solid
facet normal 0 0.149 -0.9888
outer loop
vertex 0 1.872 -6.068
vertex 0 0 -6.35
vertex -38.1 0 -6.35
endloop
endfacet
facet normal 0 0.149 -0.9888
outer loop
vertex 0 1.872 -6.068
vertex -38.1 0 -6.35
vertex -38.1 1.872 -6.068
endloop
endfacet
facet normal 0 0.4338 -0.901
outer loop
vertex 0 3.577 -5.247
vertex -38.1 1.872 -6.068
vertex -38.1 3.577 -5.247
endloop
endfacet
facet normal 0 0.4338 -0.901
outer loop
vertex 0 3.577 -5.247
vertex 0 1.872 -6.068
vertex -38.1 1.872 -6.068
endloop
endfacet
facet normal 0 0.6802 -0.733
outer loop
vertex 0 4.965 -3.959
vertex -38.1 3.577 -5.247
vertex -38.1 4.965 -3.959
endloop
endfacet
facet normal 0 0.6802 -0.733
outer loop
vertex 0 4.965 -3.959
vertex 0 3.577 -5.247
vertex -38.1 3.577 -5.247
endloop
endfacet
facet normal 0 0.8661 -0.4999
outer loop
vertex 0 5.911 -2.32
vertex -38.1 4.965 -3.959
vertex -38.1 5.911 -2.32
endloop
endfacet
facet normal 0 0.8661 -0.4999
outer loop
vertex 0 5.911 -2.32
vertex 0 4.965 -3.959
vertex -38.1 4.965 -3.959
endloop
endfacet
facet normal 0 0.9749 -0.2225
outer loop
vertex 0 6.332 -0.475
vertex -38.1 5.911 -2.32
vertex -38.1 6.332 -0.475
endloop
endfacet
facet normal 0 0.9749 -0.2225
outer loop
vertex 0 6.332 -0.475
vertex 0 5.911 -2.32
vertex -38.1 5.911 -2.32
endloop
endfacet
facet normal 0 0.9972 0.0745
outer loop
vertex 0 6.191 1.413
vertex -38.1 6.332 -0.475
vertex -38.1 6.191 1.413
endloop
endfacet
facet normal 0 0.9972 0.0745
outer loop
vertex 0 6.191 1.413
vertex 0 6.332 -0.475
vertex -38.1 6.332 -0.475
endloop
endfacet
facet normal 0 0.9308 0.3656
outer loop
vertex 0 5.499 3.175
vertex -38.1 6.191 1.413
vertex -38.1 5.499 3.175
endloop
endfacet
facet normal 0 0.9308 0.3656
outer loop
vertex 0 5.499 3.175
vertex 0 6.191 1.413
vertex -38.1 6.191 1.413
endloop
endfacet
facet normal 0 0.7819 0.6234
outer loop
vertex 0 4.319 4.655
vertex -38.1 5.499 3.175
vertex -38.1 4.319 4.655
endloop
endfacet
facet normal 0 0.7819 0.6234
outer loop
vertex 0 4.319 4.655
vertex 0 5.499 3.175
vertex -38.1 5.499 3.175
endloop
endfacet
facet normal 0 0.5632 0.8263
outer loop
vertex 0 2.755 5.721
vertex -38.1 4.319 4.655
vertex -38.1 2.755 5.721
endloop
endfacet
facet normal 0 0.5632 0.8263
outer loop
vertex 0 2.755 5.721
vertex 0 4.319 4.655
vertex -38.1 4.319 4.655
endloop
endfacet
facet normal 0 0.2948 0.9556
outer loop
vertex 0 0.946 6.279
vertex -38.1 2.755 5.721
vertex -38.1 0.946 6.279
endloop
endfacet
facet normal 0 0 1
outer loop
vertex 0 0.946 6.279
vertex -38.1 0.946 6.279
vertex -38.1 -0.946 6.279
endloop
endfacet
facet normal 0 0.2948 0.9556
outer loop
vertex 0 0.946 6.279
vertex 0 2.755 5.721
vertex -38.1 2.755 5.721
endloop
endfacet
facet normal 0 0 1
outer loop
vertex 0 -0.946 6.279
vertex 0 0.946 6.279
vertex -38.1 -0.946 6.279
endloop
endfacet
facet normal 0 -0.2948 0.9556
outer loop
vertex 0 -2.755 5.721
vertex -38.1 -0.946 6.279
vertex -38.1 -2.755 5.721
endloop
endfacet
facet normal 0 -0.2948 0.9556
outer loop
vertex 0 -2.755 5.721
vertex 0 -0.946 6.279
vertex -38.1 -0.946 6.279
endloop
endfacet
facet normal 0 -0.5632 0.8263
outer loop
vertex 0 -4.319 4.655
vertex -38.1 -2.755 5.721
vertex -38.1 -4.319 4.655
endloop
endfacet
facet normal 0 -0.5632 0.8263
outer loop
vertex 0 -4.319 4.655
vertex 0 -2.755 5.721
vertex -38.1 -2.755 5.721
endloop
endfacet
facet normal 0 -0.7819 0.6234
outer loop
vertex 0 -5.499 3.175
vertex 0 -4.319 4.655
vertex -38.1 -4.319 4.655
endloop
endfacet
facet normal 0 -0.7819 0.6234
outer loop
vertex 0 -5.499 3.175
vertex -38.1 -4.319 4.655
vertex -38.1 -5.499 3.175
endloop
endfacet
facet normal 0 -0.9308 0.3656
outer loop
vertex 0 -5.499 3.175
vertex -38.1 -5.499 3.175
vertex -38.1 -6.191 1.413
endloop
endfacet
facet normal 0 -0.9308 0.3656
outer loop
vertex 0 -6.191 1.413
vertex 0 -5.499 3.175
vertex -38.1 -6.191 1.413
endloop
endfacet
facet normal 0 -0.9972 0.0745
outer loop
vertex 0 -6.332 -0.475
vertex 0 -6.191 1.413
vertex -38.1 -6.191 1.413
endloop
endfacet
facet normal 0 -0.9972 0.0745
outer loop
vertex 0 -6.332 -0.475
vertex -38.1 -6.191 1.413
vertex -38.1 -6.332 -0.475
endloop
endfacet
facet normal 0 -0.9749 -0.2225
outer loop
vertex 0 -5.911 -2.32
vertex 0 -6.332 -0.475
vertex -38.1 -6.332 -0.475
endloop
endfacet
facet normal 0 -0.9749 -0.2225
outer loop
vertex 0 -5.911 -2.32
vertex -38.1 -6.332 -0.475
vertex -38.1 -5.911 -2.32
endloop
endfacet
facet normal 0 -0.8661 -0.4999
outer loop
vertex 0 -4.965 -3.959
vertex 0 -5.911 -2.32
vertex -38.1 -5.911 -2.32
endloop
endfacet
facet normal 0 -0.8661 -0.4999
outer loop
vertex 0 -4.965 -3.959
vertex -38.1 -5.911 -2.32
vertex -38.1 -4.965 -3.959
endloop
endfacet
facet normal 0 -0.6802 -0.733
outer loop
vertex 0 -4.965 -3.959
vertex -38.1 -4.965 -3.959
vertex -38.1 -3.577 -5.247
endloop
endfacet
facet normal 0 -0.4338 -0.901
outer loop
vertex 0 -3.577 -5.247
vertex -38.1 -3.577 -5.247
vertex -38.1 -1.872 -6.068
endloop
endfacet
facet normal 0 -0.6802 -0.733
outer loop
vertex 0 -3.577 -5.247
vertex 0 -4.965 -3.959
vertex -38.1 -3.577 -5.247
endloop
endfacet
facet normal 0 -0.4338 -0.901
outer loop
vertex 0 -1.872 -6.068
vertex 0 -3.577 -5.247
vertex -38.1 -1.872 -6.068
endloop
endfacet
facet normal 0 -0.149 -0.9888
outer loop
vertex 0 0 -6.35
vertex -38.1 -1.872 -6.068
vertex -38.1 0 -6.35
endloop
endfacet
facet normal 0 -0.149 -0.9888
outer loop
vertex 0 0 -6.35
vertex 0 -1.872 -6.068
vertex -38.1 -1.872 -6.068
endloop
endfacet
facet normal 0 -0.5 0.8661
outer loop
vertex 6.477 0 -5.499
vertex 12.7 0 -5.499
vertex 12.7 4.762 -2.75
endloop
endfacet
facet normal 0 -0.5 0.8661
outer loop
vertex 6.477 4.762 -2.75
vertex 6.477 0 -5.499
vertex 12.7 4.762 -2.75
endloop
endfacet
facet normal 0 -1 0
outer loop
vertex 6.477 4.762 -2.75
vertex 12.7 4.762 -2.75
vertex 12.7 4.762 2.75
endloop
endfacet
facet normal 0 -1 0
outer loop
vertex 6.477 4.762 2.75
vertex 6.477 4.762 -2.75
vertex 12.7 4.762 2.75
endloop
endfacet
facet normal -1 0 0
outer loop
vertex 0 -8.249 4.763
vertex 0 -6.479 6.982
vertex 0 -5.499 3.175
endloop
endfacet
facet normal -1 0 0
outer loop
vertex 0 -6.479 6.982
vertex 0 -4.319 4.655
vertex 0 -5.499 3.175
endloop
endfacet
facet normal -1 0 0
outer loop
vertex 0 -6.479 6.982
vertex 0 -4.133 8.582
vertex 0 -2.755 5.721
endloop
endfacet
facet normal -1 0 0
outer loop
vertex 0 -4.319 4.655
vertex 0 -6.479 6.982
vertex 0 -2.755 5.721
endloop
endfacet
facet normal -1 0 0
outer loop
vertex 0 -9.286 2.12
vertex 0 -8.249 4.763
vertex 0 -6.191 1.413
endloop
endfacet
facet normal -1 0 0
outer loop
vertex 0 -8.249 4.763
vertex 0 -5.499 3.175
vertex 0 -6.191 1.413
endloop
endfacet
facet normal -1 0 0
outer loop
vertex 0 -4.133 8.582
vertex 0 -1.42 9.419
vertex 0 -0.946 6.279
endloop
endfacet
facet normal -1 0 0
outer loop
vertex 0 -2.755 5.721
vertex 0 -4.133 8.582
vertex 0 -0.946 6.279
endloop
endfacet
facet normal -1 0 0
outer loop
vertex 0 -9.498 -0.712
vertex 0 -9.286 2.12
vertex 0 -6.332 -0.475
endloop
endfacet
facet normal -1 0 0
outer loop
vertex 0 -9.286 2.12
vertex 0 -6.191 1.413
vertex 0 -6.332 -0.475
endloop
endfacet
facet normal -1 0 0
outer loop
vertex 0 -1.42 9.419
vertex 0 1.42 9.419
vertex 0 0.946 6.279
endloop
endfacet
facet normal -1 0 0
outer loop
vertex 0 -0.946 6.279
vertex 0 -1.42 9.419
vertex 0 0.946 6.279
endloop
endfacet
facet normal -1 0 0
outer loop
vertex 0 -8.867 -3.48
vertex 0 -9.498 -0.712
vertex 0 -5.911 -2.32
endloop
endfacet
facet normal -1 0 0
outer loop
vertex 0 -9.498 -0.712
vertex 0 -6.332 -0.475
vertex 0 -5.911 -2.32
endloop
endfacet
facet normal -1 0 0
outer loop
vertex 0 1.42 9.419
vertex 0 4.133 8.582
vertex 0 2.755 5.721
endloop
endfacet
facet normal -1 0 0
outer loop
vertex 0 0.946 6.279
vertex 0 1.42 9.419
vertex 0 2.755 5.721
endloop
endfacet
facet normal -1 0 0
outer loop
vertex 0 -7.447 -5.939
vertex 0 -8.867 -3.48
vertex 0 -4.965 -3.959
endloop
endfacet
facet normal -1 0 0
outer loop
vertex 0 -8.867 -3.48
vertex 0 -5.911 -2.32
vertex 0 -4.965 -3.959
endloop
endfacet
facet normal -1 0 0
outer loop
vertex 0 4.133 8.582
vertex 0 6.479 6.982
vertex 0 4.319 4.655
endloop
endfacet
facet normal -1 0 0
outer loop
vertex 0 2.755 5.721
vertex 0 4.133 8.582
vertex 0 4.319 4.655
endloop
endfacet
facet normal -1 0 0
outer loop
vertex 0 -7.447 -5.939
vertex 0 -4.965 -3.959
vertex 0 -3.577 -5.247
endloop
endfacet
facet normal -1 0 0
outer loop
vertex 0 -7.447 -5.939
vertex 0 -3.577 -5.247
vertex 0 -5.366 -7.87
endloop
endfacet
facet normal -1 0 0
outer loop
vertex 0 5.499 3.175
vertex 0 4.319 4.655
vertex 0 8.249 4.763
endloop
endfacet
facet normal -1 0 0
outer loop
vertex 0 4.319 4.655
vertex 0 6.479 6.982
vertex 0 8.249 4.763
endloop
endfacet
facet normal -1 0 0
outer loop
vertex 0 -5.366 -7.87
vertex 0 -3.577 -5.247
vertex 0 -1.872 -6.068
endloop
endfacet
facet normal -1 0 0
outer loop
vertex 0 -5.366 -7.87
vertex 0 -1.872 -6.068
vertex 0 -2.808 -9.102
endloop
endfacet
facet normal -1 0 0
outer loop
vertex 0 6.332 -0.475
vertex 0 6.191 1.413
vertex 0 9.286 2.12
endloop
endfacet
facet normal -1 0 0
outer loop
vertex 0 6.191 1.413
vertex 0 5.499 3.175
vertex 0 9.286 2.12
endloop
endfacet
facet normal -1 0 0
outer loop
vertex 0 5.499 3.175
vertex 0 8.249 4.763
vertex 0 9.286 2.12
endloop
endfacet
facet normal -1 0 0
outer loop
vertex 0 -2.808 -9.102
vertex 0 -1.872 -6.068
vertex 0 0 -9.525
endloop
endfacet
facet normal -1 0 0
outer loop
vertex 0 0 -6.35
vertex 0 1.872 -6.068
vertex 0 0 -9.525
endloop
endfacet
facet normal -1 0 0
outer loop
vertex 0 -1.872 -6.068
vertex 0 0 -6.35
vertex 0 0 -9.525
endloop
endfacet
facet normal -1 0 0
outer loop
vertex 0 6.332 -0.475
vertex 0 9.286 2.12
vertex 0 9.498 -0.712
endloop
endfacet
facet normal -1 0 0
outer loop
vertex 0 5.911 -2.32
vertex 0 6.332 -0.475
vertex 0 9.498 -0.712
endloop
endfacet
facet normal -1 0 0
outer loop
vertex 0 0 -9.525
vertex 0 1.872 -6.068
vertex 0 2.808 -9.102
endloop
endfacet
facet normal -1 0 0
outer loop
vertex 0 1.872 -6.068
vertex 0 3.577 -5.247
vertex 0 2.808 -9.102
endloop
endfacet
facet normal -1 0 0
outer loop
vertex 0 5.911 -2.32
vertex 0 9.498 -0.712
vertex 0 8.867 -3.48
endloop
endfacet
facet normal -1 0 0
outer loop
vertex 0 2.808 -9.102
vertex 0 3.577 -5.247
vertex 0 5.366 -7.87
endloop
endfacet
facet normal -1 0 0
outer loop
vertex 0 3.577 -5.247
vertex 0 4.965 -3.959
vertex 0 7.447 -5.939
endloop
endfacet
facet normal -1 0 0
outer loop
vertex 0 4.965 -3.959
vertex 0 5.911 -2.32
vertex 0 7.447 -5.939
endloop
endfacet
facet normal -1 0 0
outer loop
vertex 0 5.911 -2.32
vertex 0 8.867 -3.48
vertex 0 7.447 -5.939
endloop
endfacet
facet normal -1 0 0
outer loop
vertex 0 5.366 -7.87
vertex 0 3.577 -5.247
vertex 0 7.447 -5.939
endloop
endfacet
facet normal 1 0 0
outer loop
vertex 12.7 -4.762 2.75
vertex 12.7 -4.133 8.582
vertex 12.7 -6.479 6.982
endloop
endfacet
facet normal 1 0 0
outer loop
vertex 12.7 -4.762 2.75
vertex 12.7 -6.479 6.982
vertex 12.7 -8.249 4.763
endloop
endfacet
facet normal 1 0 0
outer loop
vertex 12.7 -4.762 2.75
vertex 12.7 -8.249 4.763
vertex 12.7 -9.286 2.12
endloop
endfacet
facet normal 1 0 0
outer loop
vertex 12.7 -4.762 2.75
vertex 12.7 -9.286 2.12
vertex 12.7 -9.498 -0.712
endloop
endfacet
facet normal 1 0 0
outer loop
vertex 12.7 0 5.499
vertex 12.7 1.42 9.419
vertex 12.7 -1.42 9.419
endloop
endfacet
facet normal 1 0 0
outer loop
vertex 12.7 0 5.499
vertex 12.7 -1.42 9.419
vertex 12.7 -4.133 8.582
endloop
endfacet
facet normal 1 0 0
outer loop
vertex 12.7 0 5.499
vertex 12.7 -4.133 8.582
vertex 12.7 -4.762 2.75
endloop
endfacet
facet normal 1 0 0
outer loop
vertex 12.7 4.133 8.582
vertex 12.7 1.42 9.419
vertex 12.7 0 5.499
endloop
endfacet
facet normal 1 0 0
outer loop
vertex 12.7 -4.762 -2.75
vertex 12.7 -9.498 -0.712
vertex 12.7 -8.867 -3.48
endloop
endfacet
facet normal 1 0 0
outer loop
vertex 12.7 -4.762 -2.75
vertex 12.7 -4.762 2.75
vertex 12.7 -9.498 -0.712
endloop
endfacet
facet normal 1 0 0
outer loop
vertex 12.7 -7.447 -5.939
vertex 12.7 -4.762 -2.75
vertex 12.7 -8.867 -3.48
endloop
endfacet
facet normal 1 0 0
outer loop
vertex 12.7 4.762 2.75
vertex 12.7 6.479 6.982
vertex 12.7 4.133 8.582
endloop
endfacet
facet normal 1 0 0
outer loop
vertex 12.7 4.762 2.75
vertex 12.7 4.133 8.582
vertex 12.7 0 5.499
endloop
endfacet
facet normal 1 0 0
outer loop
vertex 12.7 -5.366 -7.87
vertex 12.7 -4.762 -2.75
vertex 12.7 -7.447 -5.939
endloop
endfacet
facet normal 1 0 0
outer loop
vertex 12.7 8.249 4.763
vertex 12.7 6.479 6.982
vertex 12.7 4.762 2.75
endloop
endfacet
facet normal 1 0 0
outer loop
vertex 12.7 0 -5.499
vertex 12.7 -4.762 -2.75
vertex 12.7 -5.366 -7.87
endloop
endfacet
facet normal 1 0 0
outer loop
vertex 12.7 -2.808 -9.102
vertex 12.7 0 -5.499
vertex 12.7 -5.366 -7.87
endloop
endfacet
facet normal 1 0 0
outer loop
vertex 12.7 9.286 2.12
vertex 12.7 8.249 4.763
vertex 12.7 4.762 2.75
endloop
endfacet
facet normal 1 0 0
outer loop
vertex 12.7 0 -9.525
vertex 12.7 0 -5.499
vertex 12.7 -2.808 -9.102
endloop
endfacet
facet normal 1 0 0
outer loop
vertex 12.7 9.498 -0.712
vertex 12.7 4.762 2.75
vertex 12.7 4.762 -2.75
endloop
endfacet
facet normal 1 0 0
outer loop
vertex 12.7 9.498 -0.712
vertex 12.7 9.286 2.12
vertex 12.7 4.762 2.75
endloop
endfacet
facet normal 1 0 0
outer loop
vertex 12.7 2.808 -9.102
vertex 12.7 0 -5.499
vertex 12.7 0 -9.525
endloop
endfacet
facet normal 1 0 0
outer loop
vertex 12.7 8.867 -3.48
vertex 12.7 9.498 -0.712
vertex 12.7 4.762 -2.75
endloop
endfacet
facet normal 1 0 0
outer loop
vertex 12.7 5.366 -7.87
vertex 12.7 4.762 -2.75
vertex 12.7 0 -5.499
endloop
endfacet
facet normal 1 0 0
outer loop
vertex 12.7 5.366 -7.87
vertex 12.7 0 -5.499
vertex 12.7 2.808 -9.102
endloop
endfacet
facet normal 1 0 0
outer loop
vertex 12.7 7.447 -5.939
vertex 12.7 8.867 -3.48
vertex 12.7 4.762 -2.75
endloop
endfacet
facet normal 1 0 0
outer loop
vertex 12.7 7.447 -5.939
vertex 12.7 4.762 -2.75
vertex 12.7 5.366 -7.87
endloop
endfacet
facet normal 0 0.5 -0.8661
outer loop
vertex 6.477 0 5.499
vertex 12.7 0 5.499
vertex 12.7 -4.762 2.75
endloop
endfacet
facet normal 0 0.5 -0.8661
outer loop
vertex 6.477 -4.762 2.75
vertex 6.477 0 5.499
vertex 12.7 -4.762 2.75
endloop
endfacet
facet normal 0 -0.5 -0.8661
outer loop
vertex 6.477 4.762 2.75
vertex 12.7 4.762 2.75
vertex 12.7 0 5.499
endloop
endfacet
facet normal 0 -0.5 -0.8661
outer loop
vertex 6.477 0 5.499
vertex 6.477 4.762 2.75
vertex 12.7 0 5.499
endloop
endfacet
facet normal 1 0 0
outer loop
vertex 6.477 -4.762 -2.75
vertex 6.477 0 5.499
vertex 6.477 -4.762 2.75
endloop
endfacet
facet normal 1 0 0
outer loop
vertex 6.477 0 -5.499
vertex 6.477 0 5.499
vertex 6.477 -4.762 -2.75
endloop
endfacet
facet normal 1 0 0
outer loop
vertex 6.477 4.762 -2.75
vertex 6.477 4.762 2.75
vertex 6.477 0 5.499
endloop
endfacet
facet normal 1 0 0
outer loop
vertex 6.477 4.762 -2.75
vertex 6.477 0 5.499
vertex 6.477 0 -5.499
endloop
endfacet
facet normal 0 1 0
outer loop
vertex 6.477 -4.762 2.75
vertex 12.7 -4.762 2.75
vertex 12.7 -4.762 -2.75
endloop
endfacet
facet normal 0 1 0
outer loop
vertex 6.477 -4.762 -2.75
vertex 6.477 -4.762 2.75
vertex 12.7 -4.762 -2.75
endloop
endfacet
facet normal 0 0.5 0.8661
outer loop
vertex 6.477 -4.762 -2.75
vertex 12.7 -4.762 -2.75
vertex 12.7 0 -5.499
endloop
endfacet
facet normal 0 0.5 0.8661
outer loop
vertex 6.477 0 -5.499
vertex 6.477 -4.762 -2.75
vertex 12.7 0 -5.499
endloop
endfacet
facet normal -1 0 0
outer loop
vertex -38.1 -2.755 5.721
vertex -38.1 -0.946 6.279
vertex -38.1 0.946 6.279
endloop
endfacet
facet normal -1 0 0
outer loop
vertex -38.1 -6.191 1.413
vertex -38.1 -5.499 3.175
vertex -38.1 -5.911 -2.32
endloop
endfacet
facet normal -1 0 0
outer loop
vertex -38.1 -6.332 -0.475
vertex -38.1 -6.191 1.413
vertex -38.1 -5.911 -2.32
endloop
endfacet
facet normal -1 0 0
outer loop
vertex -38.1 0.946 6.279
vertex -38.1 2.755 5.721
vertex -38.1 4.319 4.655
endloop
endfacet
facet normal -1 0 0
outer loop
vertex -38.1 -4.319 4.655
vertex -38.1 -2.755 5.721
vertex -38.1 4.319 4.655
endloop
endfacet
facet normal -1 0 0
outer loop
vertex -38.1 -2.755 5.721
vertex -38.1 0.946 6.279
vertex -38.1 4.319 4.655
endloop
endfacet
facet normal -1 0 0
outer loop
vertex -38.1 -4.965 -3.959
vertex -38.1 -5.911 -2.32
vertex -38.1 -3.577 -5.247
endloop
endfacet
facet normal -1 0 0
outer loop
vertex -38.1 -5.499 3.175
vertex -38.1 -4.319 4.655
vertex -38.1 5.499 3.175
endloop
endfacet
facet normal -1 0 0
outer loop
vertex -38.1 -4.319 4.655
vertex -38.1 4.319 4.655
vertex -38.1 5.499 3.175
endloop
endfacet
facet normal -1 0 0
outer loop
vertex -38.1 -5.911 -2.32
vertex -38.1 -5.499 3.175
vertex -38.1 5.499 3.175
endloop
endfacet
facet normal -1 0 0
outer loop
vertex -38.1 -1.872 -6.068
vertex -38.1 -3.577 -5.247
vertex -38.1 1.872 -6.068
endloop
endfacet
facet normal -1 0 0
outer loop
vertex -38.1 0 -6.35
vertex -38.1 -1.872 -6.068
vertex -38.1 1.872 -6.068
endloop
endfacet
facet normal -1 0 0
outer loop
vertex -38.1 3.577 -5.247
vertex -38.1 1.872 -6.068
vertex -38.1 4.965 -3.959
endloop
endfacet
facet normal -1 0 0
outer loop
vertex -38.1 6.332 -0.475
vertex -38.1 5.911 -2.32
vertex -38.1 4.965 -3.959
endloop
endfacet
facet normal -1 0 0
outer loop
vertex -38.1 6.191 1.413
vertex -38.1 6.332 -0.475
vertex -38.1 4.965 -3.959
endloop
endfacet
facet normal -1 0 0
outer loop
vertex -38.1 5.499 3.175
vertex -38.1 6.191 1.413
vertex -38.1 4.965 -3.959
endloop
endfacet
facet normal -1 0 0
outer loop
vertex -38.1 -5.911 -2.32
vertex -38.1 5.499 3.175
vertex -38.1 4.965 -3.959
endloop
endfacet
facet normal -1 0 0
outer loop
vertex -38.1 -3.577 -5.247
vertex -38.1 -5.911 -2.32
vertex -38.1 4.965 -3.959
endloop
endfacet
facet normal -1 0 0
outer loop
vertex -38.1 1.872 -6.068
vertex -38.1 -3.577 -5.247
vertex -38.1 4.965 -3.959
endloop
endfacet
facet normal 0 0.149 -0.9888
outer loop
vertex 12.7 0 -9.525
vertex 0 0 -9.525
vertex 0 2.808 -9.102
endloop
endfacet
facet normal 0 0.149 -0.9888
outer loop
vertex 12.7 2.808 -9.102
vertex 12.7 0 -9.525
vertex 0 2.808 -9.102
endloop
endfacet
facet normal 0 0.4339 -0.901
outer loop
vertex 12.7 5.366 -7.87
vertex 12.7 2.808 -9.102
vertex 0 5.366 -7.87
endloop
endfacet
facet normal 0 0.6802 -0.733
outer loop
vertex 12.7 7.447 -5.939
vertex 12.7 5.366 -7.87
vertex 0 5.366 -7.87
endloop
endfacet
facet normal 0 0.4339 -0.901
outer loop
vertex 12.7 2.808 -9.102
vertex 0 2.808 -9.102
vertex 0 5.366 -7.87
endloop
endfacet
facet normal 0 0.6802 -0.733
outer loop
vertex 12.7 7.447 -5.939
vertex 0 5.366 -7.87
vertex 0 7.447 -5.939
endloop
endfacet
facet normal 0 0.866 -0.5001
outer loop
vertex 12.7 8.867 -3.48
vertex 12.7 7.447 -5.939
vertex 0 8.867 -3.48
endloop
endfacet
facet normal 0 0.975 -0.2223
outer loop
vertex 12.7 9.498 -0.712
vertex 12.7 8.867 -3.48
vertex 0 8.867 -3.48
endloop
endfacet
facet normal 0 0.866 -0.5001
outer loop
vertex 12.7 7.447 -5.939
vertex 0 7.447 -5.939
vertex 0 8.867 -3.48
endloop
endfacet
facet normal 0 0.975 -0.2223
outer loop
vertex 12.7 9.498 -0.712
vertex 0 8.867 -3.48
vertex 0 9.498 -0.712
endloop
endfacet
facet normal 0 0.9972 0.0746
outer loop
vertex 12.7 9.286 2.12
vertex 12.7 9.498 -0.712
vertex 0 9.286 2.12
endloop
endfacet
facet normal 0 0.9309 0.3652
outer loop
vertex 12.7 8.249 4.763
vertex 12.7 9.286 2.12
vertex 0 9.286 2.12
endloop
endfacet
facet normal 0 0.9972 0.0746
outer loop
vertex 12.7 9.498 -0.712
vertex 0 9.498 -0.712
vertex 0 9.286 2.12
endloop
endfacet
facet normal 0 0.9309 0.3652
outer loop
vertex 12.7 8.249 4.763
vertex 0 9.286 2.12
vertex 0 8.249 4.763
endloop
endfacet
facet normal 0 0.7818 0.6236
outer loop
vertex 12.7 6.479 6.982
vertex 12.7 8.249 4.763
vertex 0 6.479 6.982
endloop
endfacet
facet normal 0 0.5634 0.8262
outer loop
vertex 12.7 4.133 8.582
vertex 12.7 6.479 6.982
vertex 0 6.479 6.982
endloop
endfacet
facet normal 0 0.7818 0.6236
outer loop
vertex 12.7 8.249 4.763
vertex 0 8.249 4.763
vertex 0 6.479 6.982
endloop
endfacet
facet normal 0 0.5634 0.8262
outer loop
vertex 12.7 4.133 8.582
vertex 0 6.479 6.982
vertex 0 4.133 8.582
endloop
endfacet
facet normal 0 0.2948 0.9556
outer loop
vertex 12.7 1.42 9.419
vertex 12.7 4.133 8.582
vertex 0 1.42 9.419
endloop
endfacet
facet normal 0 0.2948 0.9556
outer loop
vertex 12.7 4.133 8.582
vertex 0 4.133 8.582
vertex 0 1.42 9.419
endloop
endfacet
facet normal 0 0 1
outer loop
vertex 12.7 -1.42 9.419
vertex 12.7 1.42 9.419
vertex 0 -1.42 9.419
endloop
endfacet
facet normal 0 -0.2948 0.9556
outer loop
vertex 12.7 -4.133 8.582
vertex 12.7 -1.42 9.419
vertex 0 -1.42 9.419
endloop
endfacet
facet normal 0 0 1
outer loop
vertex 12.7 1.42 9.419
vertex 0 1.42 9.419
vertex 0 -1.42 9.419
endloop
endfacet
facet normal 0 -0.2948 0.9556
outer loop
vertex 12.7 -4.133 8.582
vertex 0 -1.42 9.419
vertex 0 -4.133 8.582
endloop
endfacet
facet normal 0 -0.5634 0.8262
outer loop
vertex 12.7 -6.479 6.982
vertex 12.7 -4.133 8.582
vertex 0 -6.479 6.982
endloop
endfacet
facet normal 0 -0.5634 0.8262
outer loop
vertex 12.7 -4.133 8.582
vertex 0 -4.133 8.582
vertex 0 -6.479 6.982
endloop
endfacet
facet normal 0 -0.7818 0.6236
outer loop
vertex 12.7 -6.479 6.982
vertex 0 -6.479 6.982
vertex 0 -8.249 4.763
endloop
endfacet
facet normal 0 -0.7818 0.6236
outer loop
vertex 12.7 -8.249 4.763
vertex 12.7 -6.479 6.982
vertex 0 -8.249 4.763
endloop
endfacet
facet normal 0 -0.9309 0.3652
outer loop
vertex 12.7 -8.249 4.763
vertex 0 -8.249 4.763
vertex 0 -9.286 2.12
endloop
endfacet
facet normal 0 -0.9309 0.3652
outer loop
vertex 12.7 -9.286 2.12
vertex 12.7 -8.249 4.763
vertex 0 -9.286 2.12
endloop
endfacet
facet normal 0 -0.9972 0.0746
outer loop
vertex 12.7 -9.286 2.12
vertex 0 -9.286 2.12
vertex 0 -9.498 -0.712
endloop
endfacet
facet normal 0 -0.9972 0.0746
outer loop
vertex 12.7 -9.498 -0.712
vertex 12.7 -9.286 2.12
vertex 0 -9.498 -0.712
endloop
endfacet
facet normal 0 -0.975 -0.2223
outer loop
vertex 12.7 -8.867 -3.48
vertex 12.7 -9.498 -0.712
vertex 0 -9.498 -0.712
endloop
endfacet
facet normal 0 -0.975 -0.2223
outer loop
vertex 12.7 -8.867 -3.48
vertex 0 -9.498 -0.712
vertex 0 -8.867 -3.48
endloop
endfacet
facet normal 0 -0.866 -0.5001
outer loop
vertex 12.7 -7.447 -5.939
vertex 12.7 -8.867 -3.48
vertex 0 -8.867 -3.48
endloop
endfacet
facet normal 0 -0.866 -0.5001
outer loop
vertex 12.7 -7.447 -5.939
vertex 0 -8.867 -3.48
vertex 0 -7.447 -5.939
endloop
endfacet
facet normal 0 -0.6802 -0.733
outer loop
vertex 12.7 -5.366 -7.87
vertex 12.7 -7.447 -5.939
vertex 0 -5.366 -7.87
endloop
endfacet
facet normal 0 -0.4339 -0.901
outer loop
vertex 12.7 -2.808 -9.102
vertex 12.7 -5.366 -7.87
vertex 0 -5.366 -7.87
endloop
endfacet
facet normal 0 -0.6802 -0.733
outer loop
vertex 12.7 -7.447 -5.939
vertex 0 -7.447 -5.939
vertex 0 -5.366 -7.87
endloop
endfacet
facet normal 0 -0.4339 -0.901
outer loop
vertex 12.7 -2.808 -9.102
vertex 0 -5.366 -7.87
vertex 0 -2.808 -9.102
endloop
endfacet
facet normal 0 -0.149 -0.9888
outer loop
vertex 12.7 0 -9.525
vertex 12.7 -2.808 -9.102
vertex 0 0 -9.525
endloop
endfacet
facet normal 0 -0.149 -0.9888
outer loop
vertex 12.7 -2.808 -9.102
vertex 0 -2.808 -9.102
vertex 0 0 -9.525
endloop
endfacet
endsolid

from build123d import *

# Parameters (mm, degrees)
SKETCH1_R           = 6.35
BOSS_EXTRUDE1_DEPTH = 38.1
SKETCH2_R           = 9.525
BOSS_EXTRUDE2_DEPTH = 12.7
CUT_EXTRUDE1_DEPTH  = 6.223


with BuildPart() as part:
    # Sketch1 → Boss-Extrude1 (new body)
    with BuildSketch(Plane(origin=(0, 0, 0), x_dir=(0, 0, -1), z_dir=(1, 0, 0))):
        Circle(SKETCH1_R)
    extrude(amount=-BOSS_EXTRUDE1_DEPTH)

    # Sketch2 → Boss-Extrude2 (add)
    with BuildSketch(Plane(origin=(0, 0, 0), x_dir=(0, 0, -1), z_dir=(1, 0, 0))):
        Circle(SKETCH2_R)
    extrude(amount=BOSS_EXTRUDE2_DEPTH)

    # Sketch3 → Cut-Extrude1 (cut)
    with BuildSketch(Plane(origin=(12.7, 0, 0), x_dir=(0, 0, -1), z_dir=(1, 0, 0))):
        Polygon((2.749630657, 4.7625), (-2.749630657, 4.7625), (-5.499261314, 0), (-2.749630657, -4.7625), (2.749630657, -4.7625), (5.499261314, 0), align=None)
    extrude(amount=-CUT_EXTRUDE1_DEPTH, mode=Mode.SUBTRACT)


solid = part.part
